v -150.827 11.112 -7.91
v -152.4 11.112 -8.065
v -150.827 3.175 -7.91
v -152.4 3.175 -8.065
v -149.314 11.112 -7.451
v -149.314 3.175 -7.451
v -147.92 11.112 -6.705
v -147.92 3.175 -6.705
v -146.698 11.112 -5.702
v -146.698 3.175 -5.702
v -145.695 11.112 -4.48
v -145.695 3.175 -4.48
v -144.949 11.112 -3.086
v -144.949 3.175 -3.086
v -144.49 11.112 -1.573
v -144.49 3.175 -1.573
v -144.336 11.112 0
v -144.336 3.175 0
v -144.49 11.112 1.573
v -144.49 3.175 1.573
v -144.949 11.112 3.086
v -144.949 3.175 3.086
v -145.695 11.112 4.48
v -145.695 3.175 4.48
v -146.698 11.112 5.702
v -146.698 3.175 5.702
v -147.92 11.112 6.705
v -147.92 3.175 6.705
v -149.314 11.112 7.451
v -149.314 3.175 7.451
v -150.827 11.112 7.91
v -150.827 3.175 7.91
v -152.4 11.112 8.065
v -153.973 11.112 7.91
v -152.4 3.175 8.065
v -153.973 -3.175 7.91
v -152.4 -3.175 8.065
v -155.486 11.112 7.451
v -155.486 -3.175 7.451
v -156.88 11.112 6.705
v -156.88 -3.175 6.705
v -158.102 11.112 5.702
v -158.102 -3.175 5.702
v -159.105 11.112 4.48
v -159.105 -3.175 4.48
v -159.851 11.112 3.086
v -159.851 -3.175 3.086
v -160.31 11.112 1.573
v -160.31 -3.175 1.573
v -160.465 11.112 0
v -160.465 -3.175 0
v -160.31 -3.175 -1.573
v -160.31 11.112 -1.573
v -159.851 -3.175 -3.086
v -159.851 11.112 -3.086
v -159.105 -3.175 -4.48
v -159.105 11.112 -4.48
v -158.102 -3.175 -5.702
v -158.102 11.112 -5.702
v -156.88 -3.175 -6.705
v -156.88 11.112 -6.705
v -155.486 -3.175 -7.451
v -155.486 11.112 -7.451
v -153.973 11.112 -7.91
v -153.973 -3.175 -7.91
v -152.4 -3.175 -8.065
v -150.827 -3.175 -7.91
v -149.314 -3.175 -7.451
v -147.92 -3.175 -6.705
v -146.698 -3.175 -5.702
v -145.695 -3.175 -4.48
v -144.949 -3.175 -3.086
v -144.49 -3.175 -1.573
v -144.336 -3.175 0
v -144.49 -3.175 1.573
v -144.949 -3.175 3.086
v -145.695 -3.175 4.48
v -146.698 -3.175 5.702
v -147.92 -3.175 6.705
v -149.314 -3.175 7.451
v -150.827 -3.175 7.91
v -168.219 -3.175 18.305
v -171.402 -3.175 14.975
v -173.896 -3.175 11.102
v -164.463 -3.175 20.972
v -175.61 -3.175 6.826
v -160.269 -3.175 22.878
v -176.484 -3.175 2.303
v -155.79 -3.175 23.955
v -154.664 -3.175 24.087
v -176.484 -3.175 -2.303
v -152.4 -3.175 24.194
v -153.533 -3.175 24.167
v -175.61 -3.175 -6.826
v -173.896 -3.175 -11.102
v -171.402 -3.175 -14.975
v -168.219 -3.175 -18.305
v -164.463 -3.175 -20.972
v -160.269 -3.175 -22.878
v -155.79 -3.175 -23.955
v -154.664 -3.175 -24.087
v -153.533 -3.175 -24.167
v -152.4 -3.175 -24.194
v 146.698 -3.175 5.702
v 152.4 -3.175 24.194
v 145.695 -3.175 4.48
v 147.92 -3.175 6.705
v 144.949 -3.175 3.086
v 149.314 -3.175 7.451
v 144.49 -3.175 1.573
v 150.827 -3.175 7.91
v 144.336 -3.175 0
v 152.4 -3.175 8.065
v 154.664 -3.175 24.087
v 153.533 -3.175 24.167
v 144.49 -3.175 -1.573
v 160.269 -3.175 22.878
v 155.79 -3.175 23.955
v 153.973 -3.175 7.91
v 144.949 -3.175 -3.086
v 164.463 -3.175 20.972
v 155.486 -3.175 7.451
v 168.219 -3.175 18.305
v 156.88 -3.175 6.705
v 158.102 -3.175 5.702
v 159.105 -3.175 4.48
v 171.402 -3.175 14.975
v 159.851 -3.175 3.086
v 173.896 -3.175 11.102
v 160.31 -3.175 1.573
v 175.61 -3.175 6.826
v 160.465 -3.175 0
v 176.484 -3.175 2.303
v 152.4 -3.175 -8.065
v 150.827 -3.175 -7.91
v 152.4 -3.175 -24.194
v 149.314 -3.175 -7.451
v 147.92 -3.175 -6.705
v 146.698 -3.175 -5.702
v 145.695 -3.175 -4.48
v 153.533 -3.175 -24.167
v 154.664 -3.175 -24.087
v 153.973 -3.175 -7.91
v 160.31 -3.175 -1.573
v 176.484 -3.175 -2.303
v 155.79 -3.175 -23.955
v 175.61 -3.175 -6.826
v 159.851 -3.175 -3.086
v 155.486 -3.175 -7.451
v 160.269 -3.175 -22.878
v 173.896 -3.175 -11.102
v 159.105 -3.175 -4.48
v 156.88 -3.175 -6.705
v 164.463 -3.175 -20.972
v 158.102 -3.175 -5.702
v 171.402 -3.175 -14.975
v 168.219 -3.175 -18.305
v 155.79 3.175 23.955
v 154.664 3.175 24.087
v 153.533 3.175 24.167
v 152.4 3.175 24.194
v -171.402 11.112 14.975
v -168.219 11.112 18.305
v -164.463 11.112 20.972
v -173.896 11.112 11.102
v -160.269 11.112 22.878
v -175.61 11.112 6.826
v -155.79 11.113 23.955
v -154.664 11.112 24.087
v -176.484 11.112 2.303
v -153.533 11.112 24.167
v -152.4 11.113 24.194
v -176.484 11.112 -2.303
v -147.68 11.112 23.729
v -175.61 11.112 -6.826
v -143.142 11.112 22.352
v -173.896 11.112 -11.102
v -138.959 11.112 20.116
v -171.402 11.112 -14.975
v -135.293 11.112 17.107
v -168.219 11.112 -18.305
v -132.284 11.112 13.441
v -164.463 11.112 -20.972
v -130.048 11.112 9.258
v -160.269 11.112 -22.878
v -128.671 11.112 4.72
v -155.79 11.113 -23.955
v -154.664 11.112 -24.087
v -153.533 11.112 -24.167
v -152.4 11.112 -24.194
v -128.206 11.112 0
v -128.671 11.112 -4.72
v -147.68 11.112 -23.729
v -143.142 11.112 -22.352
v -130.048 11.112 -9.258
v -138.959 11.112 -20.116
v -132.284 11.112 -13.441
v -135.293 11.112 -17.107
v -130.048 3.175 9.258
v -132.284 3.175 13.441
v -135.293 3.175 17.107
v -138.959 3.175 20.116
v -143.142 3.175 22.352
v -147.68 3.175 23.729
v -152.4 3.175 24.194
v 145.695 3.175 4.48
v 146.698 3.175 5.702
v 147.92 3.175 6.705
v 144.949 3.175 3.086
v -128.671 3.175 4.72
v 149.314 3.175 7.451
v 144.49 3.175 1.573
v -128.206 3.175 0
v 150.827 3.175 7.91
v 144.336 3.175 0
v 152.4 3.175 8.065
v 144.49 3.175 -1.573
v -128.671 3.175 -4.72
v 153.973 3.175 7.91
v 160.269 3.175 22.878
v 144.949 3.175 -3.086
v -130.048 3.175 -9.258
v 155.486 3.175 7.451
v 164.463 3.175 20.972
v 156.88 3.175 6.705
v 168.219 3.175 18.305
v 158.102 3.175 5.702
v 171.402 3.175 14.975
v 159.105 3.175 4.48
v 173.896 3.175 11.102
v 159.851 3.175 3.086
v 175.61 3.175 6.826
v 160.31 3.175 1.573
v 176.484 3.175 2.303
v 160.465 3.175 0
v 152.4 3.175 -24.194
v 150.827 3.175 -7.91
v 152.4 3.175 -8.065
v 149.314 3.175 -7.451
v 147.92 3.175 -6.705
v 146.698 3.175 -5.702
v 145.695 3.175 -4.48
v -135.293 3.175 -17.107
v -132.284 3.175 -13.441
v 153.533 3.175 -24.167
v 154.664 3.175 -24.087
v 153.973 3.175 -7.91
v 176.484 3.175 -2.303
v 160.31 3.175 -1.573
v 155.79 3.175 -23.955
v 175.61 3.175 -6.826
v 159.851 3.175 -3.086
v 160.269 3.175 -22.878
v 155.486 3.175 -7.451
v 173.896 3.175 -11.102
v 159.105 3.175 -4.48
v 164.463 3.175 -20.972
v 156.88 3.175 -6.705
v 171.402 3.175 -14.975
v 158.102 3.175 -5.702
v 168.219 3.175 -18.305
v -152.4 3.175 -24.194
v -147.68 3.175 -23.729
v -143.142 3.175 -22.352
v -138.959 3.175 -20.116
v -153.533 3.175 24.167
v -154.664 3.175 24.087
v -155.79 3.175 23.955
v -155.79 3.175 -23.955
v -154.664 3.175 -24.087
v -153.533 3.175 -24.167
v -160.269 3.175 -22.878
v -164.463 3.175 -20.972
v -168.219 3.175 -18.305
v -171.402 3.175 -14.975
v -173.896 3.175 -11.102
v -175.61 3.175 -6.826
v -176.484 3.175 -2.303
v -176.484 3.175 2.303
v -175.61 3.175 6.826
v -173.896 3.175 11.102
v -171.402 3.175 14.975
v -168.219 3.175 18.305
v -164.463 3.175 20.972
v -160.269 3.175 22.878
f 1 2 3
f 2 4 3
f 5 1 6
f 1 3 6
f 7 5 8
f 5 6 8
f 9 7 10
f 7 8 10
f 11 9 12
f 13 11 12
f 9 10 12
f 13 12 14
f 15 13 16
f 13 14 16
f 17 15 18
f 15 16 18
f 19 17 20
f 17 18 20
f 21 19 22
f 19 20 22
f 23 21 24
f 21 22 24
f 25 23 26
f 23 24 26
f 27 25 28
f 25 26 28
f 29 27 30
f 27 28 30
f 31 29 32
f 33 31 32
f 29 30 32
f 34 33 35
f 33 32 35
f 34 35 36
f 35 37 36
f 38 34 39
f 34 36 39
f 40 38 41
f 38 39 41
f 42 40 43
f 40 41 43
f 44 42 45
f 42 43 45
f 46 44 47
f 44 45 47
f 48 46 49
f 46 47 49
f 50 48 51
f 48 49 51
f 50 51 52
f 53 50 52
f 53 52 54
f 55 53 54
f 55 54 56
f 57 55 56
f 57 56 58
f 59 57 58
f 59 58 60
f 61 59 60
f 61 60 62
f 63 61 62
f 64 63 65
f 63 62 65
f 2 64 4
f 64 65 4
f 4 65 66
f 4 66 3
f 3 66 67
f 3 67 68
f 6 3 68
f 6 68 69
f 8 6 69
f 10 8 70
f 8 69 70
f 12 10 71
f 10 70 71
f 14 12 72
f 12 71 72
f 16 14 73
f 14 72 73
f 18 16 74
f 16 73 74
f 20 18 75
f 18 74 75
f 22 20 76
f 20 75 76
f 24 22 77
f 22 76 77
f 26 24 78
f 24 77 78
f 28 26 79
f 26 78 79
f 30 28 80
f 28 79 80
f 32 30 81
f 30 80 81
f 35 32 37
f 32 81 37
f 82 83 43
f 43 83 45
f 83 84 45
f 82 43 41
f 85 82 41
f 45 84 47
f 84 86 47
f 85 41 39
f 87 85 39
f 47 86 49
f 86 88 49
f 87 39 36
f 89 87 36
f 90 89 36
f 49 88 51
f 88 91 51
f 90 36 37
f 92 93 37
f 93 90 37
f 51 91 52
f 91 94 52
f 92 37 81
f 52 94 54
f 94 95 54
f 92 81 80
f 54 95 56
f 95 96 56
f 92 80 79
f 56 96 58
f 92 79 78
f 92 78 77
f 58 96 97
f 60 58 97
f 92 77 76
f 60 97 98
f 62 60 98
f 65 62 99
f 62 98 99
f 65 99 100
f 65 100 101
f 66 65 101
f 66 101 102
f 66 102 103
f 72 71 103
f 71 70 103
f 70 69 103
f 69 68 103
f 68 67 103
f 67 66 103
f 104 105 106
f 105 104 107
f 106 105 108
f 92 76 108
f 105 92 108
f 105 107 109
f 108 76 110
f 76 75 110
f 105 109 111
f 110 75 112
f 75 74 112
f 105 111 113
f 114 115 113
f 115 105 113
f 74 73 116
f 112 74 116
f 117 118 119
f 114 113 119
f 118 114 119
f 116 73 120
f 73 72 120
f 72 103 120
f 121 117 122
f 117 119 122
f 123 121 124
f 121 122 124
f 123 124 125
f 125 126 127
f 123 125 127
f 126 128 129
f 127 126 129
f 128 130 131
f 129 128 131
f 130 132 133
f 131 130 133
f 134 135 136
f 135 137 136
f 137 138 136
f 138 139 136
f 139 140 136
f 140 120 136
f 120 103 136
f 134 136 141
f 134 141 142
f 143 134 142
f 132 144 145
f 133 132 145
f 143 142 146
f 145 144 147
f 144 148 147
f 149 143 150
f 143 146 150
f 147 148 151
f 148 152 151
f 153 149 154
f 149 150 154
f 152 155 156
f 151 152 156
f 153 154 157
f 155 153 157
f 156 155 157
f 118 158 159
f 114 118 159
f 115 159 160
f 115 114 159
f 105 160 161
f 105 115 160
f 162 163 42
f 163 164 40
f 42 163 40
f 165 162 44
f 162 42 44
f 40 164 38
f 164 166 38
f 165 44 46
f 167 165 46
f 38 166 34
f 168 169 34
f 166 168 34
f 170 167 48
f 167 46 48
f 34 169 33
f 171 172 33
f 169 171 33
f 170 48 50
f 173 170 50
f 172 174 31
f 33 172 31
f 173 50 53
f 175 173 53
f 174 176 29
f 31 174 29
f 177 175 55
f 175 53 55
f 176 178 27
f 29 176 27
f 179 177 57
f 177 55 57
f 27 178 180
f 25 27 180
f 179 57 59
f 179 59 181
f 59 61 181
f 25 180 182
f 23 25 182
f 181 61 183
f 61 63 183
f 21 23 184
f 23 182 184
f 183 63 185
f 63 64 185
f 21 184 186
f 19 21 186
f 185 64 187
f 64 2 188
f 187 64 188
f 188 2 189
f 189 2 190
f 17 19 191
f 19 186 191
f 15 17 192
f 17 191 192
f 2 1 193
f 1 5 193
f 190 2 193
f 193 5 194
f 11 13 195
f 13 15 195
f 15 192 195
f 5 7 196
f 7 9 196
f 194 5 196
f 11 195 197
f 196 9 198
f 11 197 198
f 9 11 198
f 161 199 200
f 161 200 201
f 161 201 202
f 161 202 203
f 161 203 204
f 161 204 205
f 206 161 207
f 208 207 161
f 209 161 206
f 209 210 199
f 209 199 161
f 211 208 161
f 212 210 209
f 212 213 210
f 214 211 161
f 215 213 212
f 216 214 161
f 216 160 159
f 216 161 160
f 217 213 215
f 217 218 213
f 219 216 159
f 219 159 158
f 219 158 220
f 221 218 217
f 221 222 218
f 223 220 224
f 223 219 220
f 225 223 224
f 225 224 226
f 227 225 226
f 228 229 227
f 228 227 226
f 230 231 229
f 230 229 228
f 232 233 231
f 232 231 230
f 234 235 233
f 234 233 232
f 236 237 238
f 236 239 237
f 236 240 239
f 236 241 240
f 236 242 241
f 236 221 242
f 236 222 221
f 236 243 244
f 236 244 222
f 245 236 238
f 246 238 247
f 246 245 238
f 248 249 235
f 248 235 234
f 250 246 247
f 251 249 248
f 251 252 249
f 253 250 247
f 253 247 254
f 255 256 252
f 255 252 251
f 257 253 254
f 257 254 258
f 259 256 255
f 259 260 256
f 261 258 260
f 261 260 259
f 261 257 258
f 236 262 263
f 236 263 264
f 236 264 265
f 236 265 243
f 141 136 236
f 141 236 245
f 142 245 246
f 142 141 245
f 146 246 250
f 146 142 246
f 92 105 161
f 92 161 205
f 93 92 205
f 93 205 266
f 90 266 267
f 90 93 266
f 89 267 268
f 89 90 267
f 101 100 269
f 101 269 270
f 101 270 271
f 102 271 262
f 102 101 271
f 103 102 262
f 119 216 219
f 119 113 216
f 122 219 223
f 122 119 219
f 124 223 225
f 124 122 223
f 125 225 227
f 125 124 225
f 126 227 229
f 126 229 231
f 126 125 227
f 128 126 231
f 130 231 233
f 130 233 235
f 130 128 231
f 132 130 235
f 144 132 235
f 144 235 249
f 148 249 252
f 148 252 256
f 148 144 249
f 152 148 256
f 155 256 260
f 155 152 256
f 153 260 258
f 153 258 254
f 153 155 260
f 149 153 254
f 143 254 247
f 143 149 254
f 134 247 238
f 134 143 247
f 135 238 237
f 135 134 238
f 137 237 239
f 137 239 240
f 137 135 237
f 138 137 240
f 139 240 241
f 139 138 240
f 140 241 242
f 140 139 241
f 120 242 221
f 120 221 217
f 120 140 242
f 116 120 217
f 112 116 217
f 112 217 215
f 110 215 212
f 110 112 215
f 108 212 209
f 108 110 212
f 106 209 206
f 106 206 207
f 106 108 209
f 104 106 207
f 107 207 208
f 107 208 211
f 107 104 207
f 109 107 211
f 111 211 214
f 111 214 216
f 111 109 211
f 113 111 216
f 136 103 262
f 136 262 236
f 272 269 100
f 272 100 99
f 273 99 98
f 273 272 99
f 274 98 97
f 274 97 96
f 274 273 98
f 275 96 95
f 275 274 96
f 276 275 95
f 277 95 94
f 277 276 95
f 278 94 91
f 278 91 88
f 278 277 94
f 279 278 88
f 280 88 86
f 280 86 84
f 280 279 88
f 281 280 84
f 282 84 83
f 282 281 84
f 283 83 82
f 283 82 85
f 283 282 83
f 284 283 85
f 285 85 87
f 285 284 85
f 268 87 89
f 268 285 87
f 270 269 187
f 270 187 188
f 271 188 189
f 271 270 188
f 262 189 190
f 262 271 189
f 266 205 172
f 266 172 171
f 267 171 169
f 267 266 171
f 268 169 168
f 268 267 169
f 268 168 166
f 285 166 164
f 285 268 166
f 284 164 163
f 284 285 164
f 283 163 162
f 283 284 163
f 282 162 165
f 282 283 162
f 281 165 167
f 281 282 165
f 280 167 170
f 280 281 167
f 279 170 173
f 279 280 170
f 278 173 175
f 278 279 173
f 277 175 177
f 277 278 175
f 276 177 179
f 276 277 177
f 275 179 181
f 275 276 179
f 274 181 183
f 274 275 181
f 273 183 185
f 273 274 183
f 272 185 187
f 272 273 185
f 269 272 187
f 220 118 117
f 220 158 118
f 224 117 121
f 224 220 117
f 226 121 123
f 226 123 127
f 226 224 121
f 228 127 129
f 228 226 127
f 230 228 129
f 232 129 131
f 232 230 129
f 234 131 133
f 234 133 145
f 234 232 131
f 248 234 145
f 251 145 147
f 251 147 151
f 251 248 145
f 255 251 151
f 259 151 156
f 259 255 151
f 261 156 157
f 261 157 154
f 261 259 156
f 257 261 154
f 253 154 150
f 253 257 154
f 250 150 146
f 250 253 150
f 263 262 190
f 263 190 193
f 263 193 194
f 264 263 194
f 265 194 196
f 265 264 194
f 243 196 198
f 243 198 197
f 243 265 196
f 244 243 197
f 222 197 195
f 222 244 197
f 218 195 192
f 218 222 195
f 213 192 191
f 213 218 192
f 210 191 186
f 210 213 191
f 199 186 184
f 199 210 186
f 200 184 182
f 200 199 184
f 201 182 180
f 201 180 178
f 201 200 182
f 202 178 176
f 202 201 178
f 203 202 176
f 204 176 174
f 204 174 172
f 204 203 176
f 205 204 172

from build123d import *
from build123d.topology import SkipClean

# Parameters (mm, degrees)
SKETCH2_R               = 8.0645
BOSS_EXTRUDE2_DEPTH     = 3.175
SKETCH3_R               = 24.1935
SKETCH3_R_2             = 8.0645
BOSS_EXTRUDE3_DEPTH     = 7.9375
CUT_EXTRUDE2_DEPTH      = 181.356612
CUT_EXTRUDE2_DEPTH_BACK = 181.356612


with BuildPart() as part:
    # Sketch2 → Boss-Extrude2 (new, symmetric)
    with BuildSketch(Plane(origin=(0, 0, 0), x_dir=(1, 0, 0), z_dir=(0, 1, 0))):
        with BuildLine():
            ThreePointArc((155.79044, -23.954757), (176.5935, 0), (155.79044, 23.954757))
            ThreePointArc((155.79044, 23.954757), (0, 34.925), (-155.79044, 23.954757))
            ThreePointArc((-155.79044, 23.954757), (-176.5935, 0), (-155.79044, -23.954757))
            ThreePointArc((-155.79044, -23.954757), (0, -34.925), (155.79044, -23.954757))
        make_face()
        with Locations((-152.4, 0)):
            Circle(SKETCH2_R, mode=Mode.SUBTRACT)
        with Locations((152.4, 0)):
            Circle(SKETCH2_R, mode=Mode.SUBTRACT)
    extrude(amount=BOSS_EXTRUDE2_DEPTH, both=True)

    # Sketch3 → Boss-Extrude3 (add)
    with SkipClean():  # the faces are left unmerged after this step: merging them gives an invalid solid
        with BuildSketch(Plane.XZ.offset(-3.175)):
            with Locations((-152.4, 0)):
                Circle(SKETCH3_R)
            with Locations((-152.4, 0)):
                Circle(SKETCH3_R_2, mode=Mode.SUBTRACT)
        extrude(amount=-BOSS_EXTRUDE3_DEPTH)

    # Sketch2<3> → Cut-Extrude2 (cut, two sides: drawn at the far end of the back side and taken through both)
    with BuildSketch(Plane(origin=(0, 0, 0), x_dir=(1, 0, 0), z_dir=(0, 1, 0)).offset(-CUT_EXTRUDE2_DEPTH_BACK)):
        with BuildLine():
            Line((-152.4, 24.1935), (152.4, 24.1935))
            ThreePointArc((152.4, 24.1935), (154.099418, 24.13374), (155.79044, 23.954757))
            ThreePointArc((155.79044, 23.954757), (0, 34.925), (-155.79044, 23.954757))
            ThreePointArc((-155.79044, 23.954757), (-154.099418, 24.13374), (-152.4, 24.1935))
        make_face()
        with BuildLine():
            ThreePointArc((-155.79044, -23.954757), (0, -34.925), (155.79044, -23.954757))
            ThreePointArc((155.79044, -23.954757), (154.099418, -24.13374), (152.4, -24.1935))
            Line((152.4, -24.1935), (-152.4, -24.1935))
            ThreePointArc((-152.4, -24.1935), (-154.099418, -24.13374), (-155.79044, -23.954757))
        make_face()
    extrude(amount=CUT_EXTRUDE2_DEPTH + CUT_EXTRUDE2_DEPTH_BACK, mode=Mode.SUBTRACT)


solid = part.part
